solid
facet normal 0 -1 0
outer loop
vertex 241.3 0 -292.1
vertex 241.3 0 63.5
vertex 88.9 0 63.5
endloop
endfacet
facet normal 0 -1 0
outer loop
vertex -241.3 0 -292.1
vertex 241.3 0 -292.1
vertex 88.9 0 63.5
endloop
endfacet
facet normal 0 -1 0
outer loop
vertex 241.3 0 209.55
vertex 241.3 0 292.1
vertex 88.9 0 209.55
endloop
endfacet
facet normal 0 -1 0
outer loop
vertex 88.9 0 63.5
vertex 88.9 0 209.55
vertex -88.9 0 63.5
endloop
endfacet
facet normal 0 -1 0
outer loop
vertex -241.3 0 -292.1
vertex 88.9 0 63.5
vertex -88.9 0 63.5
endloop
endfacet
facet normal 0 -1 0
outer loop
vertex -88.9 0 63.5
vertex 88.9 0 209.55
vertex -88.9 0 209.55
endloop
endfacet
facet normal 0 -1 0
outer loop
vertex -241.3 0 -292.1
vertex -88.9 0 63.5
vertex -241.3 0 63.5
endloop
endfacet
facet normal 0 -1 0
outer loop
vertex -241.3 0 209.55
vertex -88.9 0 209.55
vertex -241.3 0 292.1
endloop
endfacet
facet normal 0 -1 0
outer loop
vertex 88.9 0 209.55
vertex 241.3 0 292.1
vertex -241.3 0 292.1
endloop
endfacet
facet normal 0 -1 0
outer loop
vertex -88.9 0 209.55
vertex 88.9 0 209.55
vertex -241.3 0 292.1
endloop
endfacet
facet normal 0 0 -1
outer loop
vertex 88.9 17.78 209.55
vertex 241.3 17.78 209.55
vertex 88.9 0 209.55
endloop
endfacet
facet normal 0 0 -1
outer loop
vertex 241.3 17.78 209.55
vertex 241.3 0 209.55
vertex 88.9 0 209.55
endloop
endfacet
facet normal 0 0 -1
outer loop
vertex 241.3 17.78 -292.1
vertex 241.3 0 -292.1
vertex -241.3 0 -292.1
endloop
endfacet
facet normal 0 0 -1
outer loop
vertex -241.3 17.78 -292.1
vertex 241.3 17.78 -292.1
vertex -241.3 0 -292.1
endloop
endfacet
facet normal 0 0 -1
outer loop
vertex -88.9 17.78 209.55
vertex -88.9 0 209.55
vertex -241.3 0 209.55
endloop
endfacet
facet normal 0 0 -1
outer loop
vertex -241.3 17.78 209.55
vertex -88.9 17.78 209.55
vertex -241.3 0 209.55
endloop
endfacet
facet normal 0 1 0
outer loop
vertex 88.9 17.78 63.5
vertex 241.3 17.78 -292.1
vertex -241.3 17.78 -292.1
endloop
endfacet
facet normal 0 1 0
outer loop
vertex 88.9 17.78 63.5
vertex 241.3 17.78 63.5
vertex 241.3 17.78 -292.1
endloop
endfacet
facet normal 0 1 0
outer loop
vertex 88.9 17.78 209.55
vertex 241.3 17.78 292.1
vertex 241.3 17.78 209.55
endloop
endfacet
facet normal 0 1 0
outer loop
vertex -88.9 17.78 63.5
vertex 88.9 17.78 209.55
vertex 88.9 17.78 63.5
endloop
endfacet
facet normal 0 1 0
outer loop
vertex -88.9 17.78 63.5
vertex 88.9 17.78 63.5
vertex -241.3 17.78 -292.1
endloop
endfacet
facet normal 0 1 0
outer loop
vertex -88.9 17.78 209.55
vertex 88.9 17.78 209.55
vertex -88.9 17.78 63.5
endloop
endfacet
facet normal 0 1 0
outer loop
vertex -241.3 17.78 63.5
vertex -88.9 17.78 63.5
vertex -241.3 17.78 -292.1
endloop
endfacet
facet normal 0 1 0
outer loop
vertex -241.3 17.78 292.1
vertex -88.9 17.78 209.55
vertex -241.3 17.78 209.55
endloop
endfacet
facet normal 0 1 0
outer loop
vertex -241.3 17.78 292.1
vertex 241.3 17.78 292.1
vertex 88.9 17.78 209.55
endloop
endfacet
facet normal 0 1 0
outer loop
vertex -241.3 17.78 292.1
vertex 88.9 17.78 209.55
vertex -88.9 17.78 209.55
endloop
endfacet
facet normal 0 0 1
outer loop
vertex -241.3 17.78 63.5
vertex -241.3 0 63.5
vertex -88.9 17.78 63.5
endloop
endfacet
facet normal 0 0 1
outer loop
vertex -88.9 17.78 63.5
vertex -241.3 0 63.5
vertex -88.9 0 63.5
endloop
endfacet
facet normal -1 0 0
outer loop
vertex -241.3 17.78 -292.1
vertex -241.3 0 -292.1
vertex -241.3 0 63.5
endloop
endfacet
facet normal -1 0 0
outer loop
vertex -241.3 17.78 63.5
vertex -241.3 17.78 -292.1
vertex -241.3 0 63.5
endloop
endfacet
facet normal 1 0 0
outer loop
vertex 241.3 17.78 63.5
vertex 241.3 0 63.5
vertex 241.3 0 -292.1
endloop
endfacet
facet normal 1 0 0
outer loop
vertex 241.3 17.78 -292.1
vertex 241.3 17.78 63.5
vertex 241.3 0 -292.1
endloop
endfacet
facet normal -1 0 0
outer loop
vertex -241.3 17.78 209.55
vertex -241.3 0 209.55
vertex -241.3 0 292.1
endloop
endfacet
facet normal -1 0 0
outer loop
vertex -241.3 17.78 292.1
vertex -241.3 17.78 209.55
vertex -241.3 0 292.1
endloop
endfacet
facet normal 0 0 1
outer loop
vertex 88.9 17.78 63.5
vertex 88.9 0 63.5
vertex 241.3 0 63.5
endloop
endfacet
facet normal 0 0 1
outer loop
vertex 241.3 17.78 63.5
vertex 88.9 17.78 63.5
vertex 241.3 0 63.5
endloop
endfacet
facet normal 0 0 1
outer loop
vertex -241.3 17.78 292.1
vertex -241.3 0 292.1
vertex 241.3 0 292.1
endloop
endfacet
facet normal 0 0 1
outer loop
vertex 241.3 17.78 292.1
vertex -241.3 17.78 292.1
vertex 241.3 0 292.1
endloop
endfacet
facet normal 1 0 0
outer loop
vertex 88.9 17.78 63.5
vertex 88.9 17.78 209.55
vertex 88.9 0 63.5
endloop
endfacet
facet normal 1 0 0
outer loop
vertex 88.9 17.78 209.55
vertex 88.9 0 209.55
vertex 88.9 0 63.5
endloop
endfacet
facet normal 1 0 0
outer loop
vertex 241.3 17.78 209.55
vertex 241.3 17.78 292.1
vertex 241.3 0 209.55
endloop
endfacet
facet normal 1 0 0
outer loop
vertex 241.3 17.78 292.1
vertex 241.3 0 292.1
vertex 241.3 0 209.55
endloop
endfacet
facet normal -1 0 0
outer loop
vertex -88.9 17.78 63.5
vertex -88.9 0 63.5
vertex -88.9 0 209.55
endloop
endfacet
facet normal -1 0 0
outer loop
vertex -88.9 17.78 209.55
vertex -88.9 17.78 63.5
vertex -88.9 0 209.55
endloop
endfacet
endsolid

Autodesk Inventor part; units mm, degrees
ref_plane "XZ Plane" through (0, 0, 0) normal (0, 1, 0) x (-1, 0, 0)
ref_plane "XY Plane" through (0, 0, 0) normal (0, 0, 1) x (1, 0, 0)
sketch "Sketch1" plane through (0, 0, 0) normal (0, 1, 0) x (-1, 0, 0)
  line L0 (-241.3, 292.1) -> (-241.3, -292.1)
  line L1 (-241.3, -292.1) -> (241.3, -292.1)
  line L2 (241.3, -292.1) -> (241.3, 292.1)
  line L3 (241.3, 292.1) -> (-241.3, 292.1)
  line L4 (-241.3, 292.1) -> (241.3, -292.1) construction
  line L5 (-241.3, -292.1) -> (241.3, 292.1) construction
  point P0 (0, 0)
  dimension "baseLength" = 584.2
  dimension "baseWidth" = 482.6
extrude "Extrusion1" add sketch "Sketch1" along normal blind 17.78
sketch "Sketch2" plane through (0, 0, 0) normal (0, -1, 0) x (1, 0, 0)
  line L0 (241.3, 292.1) -> (241.3, -292.1) projected
  line L1 (241.3, 209.55) -> (88.9, 209.55)
  line L2 (88.9, 209.55) -> (88.9, 63.5)
  line L3 (88.9, 63.5) -> (241.3, 63.5)
  line L4 (241.3, 63.5) -> (241.3, 209.55)
  line L5 (-241.3, 292.1) -> (241.3, 292.1) projected
  point P0 (0, 0)
  dimension "backToEndOfGearBox" = 82.55
  dimension "backToFrontOfGearBox" = 228.6
  dimension "wdithForGearBox" = 152.4
extrude "Extrusion2" cut sketch "Sketch2" against normal through all
mirror "Mirror1" about plane through (0, 0, 0) normal (1, 0, 0) of "Extrusion2"
equation "\"spaceingAlongSides\" = 3.175"
equation "\"distanceFromBackForEndBolt\" = 38.1"
equation "\"spacingForBolt\" = 25.4"
equation "\"widthOfSpacingForBolt\" = 12.7"
equation "\"lengthOfSpacingForBolt\" = 25.4"
properties part number "RhinoBottomFloorPlate04" material "Wood (Birch)"
